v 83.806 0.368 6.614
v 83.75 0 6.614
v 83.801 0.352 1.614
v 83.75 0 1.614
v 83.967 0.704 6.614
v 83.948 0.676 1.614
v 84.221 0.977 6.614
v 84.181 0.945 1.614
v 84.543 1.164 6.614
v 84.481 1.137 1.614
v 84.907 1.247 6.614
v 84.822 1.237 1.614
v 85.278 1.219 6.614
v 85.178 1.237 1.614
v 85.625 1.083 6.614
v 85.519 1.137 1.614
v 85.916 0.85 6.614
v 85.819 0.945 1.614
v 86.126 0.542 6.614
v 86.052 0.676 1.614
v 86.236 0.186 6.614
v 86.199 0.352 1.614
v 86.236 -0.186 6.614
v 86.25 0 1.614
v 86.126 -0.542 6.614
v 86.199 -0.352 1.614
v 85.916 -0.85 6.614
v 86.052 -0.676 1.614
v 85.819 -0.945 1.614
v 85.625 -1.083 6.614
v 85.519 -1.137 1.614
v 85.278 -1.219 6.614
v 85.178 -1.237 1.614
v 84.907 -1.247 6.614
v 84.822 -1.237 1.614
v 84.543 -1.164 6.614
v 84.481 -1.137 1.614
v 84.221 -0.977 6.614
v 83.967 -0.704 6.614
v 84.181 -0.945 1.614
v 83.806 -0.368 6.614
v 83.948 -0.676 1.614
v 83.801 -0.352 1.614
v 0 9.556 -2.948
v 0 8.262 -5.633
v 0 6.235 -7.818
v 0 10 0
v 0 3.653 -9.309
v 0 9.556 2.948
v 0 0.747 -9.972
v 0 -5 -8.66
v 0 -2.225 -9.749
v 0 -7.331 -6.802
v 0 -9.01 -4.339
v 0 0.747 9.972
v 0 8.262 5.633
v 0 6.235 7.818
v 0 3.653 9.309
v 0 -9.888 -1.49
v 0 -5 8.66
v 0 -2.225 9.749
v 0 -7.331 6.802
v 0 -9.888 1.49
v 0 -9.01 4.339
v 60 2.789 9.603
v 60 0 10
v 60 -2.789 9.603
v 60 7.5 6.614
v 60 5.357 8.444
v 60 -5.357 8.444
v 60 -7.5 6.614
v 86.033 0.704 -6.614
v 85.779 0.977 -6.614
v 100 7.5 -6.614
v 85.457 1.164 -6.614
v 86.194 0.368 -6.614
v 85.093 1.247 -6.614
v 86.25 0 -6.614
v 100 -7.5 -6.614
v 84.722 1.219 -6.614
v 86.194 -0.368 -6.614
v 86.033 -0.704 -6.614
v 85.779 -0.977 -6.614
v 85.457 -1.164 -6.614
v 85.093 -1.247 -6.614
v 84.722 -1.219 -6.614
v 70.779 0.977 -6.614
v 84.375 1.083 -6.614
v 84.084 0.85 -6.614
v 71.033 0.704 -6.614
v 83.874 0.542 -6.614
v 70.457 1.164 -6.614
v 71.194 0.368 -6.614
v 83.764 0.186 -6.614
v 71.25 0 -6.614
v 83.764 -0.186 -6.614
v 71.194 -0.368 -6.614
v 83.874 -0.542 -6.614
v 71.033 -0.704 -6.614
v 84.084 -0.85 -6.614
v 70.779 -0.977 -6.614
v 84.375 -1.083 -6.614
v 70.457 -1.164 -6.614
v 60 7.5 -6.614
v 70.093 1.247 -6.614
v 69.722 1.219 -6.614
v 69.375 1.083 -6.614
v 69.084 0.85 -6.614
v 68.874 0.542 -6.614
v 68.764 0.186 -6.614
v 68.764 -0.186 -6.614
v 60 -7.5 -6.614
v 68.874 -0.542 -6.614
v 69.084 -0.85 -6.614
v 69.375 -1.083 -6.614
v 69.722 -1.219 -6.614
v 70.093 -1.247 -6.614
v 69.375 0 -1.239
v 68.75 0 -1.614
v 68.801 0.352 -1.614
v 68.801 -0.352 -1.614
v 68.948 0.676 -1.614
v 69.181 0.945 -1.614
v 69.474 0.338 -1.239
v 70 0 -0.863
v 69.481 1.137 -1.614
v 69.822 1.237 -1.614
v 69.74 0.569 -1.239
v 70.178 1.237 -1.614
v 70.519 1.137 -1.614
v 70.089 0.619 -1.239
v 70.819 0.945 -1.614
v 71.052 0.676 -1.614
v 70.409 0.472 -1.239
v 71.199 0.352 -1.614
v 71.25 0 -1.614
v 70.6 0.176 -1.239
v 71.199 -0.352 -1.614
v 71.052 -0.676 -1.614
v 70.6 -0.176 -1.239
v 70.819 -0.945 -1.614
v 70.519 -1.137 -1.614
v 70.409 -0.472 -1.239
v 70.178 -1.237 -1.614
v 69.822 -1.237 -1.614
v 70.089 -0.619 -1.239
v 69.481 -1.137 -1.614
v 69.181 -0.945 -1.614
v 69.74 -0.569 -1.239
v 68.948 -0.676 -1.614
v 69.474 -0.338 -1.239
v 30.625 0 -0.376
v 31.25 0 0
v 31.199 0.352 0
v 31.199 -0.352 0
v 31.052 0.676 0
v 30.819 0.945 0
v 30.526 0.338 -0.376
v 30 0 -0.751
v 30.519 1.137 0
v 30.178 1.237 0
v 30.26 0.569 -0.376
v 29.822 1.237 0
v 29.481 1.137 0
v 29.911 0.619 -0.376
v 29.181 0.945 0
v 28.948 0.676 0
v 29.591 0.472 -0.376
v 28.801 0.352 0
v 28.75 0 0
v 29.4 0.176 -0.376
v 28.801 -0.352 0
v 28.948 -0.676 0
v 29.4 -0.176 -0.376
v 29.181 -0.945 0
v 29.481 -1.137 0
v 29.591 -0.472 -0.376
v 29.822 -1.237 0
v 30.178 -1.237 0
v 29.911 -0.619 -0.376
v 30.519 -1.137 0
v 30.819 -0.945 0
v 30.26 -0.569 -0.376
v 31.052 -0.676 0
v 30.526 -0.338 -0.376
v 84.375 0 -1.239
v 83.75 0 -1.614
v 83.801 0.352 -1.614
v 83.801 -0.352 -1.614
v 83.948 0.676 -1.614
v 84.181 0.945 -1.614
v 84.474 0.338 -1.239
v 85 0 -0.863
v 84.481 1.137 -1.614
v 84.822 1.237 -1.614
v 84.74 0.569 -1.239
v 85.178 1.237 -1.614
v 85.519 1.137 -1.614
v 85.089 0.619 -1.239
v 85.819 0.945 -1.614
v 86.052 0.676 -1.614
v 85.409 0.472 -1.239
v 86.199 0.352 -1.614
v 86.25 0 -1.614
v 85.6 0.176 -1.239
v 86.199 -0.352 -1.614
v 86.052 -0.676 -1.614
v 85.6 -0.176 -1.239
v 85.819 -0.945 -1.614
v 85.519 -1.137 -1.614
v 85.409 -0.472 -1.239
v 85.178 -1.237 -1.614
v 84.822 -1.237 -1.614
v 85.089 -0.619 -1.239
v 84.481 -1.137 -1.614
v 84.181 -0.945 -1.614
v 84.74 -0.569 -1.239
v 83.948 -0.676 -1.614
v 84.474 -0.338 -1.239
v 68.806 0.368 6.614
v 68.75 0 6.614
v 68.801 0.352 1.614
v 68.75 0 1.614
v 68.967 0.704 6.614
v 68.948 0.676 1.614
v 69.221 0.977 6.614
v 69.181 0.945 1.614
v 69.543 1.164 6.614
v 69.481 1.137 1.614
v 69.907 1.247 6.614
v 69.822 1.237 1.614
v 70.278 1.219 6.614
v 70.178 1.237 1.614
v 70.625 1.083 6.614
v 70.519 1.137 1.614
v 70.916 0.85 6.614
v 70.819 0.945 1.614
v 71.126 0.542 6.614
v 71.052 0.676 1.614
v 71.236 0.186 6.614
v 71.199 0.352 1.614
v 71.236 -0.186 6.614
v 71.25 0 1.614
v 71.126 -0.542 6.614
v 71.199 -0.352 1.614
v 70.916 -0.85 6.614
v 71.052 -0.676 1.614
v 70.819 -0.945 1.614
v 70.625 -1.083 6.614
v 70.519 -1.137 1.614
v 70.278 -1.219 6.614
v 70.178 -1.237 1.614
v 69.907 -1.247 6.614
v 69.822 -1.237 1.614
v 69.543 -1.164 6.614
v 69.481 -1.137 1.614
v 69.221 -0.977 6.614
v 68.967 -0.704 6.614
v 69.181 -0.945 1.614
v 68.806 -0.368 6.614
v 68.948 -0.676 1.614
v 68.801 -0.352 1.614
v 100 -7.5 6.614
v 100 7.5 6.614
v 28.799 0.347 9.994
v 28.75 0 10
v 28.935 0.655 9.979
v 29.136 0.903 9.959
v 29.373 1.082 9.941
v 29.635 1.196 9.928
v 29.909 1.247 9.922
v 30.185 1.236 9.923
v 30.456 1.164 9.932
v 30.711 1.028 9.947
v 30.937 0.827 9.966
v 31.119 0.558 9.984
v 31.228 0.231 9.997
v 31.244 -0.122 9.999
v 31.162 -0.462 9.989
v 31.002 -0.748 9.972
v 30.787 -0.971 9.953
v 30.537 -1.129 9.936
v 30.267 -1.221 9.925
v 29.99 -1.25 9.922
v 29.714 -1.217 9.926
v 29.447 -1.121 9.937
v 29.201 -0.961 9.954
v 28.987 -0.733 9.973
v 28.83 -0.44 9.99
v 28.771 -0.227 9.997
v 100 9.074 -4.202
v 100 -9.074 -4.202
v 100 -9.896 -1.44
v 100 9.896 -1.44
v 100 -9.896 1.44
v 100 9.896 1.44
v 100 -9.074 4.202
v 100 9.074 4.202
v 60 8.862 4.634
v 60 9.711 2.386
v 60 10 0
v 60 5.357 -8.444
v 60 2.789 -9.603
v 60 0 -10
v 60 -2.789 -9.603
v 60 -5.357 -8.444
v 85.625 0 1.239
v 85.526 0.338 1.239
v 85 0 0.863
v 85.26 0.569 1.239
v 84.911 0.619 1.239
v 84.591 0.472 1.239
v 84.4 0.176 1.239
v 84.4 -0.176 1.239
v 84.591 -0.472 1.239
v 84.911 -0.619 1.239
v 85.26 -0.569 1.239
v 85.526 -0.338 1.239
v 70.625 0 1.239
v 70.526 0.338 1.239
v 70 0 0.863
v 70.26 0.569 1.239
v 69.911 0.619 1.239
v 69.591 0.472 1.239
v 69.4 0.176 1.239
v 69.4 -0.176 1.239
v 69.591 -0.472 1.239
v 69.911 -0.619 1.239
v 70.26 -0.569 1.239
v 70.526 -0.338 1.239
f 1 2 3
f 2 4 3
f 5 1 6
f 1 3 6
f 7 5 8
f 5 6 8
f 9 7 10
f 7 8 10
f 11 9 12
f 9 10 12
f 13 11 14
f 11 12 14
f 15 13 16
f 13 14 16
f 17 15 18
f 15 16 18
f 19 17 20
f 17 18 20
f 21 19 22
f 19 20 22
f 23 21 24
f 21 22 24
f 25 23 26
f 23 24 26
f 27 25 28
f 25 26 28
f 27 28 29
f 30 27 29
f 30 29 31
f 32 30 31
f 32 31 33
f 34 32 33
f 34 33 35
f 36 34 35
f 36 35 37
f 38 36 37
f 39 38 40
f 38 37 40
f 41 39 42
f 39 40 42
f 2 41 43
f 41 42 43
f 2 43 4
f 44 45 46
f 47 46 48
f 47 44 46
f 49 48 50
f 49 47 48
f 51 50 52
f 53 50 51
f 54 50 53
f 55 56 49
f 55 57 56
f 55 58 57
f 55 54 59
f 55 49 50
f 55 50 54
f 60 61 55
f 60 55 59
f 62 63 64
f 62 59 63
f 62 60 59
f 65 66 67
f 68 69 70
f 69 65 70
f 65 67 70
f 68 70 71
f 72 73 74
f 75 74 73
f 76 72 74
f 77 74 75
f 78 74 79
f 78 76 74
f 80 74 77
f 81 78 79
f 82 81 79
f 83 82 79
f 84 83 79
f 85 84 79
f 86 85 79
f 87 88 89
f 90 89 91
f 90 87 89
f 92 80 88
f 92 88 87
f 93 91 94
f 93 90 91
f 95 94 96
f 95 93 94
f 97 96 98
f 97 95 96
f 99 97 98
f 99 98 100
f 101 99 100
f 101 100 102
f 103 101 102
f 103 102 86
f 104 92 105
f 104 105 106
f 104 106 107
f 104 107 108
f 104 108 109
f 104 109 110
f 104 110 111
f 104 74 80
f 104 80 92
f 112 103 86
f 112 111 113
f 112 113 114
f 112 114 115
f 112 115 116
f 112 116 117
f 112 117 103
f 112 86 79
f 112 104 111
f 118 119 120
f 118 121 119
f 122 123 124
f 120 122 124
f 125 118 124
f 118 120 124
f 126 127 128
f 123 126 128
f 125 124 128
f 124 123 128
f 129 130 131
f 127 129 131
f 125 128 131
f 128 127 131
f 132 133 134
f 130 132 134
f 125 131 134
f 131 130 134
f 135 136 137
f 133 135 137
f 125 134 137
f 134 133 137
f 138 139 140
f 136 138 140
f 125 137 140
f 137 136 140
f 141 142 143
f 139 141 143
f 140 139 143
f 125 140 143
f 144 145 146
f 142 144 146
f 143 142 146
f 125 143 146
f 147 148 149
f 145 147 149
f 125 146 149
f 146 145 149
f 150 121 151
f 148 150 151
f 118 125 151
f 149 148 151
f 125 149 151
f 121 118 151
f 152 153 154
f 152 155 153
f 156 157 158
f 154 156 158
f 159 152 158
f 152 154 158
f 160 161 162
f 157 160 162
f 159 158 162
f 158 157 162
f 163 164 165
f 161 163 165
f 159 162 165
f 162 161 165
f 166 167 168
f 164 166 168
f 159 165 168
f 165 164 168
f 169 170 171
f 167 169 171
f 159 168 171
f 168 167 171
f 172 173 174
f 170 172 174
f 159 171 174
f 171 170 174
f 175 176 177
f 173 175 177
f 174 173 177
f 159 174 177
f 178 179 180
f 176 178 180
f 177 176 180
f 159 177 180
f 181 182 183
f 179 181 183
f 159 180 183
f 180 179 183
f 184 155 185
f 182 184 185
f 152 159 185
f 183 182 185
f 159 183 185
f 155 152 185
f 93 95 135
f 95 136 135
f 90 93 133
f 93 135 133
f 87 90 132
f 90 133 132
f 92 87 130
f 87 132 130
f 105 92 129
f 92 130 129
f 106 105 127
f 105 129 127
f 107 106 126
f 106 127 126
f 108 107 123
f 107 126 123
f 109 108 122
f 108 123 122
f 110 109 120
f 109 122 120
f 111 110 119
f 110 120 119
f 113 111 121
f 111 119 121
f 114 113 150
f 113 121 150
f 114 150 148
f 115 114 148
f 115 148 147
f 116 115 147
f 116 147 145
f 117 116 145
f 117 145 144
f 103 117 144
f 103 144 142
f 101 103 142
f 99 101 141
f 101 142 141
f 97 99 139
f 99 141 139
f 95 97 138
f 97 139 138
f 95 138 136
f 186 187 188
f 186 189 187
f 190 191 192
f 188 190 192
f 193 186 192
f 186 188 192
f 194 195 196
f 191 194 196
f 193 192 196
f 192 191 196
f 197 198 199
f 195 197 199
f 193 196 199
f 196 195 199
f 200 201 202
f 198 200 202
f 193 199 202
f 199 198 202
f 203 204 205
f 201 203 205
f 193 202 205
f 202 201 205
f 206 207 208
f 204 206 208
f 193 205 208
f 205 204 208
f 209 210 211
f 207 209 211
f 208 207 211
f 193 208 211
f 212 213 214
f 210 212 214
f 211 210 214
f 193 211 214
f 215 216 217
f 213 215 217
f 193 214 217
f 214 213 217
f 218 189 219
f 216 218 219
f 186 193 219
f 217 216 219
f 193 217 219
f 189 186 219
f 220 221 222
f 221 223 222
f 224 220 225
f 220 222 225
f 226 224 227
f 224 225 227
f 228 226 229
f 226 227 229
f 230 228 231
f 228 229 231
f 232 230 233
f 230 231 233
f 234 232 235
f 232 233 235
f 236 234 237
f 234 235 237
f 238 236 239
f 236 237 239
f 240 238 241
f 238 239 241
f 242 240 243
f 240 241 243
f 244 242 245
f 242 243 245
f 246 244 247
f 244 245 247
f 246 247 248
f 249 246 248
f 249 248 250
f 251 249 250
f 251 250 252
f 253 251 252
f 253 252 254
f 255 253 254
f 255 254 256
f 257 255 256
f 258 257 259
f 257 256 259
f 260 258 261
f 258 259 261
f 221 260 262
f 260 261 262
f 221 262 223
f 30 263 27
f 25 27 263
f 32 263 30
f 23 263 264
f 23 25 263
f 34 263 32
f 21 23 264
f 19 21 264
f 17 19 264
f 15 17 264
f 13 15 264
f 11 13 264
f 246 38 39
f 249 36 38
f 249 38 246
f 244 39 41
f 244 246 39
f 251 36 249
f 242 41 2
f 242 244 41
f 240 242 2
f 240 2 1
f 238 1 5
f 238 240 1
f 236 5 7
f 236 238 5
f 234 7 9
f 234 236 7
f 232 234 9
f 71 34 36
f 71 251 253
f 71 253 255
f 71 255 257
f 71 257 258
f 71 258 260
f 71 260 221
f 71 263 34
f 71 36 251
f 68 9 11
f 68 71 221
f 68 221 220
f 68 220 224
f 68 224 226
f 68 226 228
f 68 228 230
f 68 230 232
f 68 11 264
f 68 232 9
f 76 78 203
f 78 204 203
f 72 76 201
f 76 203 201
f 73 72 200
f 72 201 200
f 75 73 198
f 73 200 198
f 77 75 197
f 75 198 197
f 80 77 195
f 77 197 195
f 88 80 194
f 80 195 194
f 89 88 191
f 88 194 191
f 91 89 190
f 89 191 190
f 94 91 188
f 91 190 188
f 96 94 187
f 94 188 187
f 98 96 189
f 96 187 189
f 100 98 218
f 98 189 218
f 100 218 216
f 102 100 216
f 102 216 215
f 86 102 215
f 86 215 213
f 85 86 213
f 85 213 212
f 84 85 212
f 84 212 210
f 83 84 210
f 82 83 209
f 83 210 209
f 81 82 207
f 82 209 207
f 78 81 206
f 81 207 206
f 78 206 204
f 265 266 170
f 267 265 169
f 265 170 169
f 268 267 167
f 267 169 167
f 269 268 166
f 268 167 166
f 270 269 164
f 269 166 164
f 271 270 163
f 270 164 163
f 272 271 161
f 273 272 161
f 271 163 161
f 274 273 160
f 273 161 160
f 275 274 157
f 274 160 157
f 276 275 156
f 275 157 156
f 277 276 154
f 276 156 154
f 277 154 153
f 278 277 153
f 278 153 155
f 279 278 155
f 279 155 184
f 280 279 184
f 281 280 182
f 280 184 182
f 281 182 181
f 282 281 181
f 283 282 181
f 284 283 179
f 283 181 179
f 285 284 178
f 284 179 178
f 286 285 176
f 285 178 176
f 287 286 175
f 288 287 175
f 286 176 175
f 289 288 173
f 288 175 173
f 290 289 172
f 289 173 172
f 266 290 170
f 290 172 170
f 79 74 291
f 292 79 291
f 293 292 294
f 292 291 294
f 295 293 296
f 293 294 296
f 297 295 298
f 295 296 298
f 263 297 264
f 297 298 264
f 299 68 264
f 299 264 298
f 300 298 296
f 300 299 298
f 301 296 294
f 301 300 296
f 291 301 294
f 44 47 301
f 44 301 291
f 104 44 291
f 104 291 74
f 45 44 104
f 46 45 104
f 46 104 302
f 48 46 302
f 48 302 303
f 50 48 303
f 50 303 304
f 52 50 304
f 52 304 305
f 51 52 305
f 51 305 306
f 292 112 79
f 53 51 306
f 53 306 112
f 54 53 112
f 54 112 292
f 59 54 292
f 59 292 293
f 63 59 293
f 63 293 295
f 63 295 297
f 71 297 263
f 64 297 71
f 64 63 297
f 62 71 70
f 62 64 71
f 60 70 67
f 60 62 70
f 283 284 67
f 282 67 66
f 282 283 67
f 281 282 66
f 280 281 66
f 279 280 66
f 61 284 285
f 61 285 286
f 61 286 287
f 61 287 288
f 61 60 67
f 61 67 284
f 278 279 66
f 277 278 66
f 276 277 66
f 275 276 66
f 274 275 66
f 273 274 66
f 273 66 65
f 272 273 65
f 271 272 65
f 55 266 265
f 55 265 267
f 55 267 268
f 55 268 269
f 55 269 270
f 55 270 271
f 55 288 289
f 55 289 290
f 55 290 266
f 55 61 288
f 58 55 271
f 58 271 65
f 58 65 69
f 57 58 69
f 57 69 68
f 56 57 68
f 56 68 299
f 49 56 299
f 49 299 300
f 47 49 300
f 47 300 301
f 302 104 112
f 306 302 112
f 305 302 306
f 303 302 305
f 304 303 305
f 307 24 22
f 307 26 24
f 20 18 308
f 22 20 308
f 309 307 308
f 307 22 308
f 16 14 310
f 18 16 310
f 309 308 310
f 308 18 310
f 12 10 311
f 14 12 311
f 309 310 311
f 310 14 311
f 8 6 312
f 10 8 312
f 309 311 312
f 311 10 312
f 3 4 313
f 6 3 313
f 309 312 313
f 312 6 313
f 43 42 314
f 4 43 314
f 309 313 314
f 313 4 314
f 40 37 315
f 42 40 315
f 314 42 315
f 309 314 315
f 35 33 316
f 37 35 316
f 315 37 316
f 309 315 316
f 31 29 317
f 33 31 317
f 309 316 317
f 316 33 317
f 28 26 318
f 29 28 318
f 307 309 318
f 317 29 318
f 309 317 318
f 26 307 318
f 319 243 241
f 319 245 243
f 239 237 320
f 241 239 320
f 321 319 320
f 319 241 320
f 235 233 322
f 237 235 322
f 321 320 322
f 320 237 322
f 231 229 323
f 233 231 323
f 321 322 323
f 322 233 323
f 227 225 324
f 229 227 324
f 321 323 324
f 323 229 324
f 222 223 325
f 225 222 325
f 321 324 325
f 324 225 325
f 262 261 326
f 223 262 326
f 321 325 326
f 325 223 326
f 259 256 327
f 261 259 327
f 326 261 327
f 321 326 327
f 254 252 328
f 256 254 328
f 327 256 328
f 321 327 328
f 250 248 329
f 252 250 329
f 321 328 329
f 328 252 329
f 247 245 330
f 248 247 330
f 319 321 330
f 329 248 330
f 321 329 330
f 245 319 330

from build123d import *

# Parameters (mm, degrees)
SKETCH1_W                           = 60
SKETCH1_H                           = 10
BOSS_EXTRUDE1_DEPTH                 = 40
M3X0_5_TAPPED_HOLE3_D               = 2.5
M3X0_5_TAPPED_HOLE3_DEPTH           = 10
M3X0_5_TAPPED_HOLE3_TIP             = 0.751075774
M3X0_5_TAPPED_HOLE2_D               = 2.5
M3X0_5_TAPPED_HOLE2_DEPTH           = 5
M3X0_5_TAPPED_HOLE2_TIP             = 0.751075774
M3X0_5_TAPPED_HOLE2_ON_FACE_2_D     = 2.5
M3X0_5_TAPPED_HOLE2_ON_FACE_2_DEPTH = 5
M3X0_5_TAPPED_HOLE2_ON_FACE_2_TIP   = 0.751075774


with BuildPart() as part:
    # Sketch1 → Revolve1 (revolve)
    with BuildSketch(Plane.XY):
        with Locations((30, 5)):
            Rectangle(SKETCH1_W, SKETCH1_H)
    revolve(axis=Axis((0, 0, 0), (1, 0, 0)))

    # Sketch3 → Boss-Extrude1 (add)
    with BuildSketch(Plane(origin=(60, 0, 0), x_dir=(0, 0, -1), z_dir=(1, 0, 0))):
        with BuildLine():
            Line((-6.614378278, -7.5), (-6.614378278, 7.5))
            ThreePointArc((-6.614378278, 7.5), (0, 10), (6.614378278, 7.5))
            Line((6.614378278, 7.5), (6.614378278, -7.5))
            ThreePointArc((6.614378278, -7.5), (0, -10), (-6.614378278, -7.5))
        make_face()
    extrude(amount=BOSS_EXTRUDE1_DEPTH)

    # M3x0.5 Tapped Hole3
    with Locations(Plane.XY.offset(10)):
        with Locations((30, 0)):
            Hole(M3X0_5_TAPPED_HOLE3_D / 2, depth=M3X0_5_TAPPED_HOLE3_DEPTH)
            with Locations((0, 0, -(M3X0_5_TAPPED_HOLE3_DEPTH + M3X0_5_TAPPED_HOLE3_TIP / 2))):  # 118° drill point
                Cone(0, M3X0_5_TAPPED_HOLE3_D / 2, M3X0_5_TAPPED_HOLE3_TIP, mode=Mode.SUBTRACT)

    # M3x0.5 Tapped Hole2
    with Locations(Plane(origin=(70, 0, 6.614378278), x_dir=(1, 0, 0), z_dir=(0, 0, 1))):
        with Locations((0, 0), (15, 0)):
            Hole(M3X0_5_TAPPED_HOLE2_D / 2, depth=M3X0_5_TAPPED_HOLE2_DEPTH)
            with Locations((0, 0, -(M3X0_5_TAPPED_HOLE2_DEPTH + M3X0_5_TAPPED_HOLE2_TIP / 2))):  # 118° drill point
                Cone(0, M3X0_5_TAPPED_HOLE2_D / 2, M3X0_5_TAPPED_HOLE2_TIP, mode=Mode.SUBTRACT)

    # M3x0.5 Tapped Hole2 on face 2
    with Locations(Plane(origin=(85, 0, -6.614378278), x_dir=(-1, 0, 0), z_dir=(0, 0, -1))):
        with Locations((0, 0), (15, 0)):
            Hole(M3X0_5_TAPPED_HOLE2_ON_FACE_2_D / 2, depth=M3X0_5_TAPPED_HOLE2_ON_FACE_2_DEPTH)
            with Locations((0, 0, -(M3X0_5_TAPPED_HOLE2_ON_FACE_2_DEPTH + M3X0_5_TAPPED_HOLE2_ON_FACE_2_TIP / 2))):  # 118° drill point
                Cone(0, M3X0_5_TAPPED_HOLE2_ON_FACE_2_D / 2, M3X0_5_TAPPED_HOLE2_ON_FACE_2_TIP, mode=Mode.SUBTRACT)


solid = part.part
